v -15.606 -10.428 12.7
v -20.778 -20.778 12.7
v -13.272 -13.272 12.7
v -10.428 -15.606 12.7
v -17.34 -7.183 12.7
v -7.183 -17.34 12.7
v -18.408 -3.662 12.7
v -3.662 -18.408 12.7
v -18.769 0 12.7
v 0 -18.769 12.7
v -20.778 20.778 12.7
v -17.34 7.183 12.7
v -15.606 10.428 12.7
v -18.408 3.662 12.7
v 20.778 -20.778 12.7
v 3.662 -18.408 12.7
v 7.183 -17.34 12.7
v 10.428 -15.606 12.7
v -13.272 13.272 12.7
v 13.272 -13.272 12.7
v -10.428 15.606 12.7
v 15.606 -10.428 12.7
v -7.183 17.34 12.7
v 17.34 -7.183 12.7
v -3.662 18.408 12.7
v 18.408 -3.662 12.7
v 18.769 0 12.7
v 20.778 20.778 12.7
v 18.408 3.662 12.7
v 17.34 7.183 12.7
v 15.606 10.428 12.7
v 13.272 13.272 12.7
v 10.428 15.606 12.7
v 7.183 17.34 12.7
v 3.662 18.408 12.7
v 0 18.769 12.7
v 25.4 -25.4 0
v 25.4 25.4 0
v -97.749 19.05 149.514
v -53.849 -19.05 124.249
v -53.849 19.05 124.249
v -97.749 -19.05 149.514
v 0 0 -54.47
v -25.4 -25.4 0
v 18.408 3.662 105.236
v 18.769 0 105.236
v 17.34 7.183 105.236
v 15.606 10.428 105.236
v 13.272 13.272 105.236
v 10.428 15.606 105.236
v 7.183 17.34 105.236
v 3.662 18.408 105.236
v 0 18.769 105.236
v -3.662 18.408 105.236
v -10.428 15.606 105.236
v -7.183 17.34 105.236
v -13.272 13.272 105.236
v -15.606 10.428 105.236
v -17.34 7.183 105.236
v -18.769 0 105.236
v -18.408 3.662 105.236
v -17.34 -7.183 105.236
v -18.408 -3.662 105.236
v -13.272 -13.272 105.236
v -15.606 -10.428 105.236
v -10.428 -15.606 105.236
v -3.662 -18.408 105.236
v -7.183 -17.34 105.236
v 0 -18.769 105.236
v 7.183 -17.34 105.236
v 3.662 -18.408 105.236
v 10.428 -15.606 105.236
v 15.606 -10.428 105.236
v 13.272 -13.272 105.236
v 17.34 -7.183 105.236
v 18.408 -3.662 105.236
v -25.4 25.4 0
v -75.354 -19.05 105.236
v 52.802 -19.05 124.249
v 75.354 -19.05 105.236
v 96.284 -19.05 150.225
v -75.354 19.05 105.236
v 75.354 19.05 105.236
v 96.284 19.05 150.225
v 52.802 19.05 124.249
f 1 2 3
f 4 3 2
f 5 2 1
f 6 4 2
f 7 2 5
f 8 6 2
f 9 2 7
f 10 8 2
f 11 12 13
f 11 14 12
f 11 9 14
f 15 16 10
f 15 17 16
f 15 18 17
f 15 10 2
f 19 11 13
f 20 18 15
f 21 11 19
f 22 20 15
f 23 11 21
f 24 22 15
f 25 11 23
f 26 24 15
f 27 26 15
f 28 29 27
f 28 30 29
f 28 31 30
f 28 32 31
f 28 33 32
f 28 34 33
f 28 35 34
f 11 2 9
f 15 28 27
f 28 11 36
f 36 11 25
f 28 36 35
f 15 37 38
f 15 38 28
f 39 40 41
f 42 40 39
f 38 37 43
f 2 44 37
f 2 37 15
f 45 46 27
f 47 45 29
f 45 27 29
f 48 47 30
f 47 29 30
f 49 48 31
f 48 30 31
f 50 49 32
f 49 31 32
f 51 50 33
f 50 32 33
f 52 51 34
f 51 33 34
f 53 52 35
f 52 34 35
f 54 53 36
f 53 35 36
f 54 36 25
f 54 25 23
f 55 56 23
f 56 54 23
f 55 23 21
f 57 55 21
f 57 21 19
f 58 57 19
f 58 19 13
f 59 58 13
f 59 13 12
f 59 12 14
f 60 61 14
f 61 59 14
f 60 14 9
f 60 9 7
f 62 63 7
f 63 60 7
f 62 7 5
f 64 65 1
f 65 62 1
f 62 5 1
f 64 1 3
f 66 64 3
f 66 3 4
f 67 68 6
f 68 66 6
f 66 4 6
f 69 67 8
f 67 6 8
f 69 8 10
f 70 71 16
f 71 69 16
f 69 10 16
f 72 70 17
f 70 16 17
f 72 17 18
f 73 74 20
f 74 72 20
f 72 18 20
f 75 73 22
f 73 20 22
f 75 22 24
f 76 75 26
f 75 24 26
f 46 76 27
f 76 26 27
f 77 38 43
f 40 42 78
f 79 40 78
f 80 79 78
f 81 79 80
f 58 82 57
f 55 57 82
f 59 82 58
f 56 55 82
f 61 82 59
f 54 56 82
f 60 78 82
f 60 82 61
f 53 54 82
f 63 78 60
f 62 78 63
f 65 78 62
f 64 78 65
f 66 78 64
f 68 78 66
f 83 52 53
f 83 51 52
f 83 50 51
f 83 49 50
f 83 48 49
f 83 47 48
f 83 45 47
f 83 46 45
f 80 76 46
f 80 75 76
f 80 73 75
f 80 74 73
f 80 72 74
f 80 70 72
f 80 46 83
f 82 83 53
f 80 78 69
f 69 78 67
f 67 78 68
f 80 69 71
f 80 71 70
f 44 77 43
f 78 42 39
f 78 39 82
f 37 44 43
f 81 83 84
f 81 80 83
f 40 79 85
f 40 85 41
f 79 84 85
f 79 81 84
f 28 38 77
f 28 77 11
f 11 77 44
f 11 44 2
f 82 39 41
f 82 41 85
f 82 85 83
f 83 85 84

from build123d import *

# Parameters (mm, degrees)
F0_W      = 50.8
F0_H      = 50.8
F1_FACE_W = 50.8
F1_FACE_H = 50.8
F2_DEPTH  = 12.7
F2_TAPER  = 20
F3_R      = 18.7690091821
F4_DEPTH  = 101.6
F6_DEPTH  = 19.05


# Not quite as in the source:
# - an extrude whose draft closes it to a point is written as a loft to that point


with BuildPart() as f1:
    # F0 (on Top) → F1 section 0
    with BuildSketch(Plane.XY, mode=Mode.PRIVATE) as f1_s0:
        Rectangle(F0_W, F0_H)
    loft([f1_s0.sketch, Vertex(0, 0, -54.4704757809)], ruled=True)

    # F1_face (on face) → F2 (join)
    with BuildSketch(Plane.XY):
        Rectangle(F1_FACE_W, F1_FACE_H)
    extrude(amount=F2_DEPTH, taper=F2_TAPER)

    # F3 (on face) → F4 (join)
    with BuildSketch(Plane.XY.offset(12.7)):
        Circle(F3_R)
    extrude(amount=F4_DEPTH)

    # F5 (on Front) → F6 (join, symmetric)
    with BuildSketch(Plane.XZ):
        Polygon((96.2837857294, 150.2247155843), (52.8015196323, 124.2486089468), (-53.8494151779, 124.2486089468), (-97.7485626936, 149.513810873), (-75.3541216254, 105.235889554), (75.3541216254, 105.235889554), align=None)
    extrude(amount=F6_DEPTH, both=True)


solid = f1.part
